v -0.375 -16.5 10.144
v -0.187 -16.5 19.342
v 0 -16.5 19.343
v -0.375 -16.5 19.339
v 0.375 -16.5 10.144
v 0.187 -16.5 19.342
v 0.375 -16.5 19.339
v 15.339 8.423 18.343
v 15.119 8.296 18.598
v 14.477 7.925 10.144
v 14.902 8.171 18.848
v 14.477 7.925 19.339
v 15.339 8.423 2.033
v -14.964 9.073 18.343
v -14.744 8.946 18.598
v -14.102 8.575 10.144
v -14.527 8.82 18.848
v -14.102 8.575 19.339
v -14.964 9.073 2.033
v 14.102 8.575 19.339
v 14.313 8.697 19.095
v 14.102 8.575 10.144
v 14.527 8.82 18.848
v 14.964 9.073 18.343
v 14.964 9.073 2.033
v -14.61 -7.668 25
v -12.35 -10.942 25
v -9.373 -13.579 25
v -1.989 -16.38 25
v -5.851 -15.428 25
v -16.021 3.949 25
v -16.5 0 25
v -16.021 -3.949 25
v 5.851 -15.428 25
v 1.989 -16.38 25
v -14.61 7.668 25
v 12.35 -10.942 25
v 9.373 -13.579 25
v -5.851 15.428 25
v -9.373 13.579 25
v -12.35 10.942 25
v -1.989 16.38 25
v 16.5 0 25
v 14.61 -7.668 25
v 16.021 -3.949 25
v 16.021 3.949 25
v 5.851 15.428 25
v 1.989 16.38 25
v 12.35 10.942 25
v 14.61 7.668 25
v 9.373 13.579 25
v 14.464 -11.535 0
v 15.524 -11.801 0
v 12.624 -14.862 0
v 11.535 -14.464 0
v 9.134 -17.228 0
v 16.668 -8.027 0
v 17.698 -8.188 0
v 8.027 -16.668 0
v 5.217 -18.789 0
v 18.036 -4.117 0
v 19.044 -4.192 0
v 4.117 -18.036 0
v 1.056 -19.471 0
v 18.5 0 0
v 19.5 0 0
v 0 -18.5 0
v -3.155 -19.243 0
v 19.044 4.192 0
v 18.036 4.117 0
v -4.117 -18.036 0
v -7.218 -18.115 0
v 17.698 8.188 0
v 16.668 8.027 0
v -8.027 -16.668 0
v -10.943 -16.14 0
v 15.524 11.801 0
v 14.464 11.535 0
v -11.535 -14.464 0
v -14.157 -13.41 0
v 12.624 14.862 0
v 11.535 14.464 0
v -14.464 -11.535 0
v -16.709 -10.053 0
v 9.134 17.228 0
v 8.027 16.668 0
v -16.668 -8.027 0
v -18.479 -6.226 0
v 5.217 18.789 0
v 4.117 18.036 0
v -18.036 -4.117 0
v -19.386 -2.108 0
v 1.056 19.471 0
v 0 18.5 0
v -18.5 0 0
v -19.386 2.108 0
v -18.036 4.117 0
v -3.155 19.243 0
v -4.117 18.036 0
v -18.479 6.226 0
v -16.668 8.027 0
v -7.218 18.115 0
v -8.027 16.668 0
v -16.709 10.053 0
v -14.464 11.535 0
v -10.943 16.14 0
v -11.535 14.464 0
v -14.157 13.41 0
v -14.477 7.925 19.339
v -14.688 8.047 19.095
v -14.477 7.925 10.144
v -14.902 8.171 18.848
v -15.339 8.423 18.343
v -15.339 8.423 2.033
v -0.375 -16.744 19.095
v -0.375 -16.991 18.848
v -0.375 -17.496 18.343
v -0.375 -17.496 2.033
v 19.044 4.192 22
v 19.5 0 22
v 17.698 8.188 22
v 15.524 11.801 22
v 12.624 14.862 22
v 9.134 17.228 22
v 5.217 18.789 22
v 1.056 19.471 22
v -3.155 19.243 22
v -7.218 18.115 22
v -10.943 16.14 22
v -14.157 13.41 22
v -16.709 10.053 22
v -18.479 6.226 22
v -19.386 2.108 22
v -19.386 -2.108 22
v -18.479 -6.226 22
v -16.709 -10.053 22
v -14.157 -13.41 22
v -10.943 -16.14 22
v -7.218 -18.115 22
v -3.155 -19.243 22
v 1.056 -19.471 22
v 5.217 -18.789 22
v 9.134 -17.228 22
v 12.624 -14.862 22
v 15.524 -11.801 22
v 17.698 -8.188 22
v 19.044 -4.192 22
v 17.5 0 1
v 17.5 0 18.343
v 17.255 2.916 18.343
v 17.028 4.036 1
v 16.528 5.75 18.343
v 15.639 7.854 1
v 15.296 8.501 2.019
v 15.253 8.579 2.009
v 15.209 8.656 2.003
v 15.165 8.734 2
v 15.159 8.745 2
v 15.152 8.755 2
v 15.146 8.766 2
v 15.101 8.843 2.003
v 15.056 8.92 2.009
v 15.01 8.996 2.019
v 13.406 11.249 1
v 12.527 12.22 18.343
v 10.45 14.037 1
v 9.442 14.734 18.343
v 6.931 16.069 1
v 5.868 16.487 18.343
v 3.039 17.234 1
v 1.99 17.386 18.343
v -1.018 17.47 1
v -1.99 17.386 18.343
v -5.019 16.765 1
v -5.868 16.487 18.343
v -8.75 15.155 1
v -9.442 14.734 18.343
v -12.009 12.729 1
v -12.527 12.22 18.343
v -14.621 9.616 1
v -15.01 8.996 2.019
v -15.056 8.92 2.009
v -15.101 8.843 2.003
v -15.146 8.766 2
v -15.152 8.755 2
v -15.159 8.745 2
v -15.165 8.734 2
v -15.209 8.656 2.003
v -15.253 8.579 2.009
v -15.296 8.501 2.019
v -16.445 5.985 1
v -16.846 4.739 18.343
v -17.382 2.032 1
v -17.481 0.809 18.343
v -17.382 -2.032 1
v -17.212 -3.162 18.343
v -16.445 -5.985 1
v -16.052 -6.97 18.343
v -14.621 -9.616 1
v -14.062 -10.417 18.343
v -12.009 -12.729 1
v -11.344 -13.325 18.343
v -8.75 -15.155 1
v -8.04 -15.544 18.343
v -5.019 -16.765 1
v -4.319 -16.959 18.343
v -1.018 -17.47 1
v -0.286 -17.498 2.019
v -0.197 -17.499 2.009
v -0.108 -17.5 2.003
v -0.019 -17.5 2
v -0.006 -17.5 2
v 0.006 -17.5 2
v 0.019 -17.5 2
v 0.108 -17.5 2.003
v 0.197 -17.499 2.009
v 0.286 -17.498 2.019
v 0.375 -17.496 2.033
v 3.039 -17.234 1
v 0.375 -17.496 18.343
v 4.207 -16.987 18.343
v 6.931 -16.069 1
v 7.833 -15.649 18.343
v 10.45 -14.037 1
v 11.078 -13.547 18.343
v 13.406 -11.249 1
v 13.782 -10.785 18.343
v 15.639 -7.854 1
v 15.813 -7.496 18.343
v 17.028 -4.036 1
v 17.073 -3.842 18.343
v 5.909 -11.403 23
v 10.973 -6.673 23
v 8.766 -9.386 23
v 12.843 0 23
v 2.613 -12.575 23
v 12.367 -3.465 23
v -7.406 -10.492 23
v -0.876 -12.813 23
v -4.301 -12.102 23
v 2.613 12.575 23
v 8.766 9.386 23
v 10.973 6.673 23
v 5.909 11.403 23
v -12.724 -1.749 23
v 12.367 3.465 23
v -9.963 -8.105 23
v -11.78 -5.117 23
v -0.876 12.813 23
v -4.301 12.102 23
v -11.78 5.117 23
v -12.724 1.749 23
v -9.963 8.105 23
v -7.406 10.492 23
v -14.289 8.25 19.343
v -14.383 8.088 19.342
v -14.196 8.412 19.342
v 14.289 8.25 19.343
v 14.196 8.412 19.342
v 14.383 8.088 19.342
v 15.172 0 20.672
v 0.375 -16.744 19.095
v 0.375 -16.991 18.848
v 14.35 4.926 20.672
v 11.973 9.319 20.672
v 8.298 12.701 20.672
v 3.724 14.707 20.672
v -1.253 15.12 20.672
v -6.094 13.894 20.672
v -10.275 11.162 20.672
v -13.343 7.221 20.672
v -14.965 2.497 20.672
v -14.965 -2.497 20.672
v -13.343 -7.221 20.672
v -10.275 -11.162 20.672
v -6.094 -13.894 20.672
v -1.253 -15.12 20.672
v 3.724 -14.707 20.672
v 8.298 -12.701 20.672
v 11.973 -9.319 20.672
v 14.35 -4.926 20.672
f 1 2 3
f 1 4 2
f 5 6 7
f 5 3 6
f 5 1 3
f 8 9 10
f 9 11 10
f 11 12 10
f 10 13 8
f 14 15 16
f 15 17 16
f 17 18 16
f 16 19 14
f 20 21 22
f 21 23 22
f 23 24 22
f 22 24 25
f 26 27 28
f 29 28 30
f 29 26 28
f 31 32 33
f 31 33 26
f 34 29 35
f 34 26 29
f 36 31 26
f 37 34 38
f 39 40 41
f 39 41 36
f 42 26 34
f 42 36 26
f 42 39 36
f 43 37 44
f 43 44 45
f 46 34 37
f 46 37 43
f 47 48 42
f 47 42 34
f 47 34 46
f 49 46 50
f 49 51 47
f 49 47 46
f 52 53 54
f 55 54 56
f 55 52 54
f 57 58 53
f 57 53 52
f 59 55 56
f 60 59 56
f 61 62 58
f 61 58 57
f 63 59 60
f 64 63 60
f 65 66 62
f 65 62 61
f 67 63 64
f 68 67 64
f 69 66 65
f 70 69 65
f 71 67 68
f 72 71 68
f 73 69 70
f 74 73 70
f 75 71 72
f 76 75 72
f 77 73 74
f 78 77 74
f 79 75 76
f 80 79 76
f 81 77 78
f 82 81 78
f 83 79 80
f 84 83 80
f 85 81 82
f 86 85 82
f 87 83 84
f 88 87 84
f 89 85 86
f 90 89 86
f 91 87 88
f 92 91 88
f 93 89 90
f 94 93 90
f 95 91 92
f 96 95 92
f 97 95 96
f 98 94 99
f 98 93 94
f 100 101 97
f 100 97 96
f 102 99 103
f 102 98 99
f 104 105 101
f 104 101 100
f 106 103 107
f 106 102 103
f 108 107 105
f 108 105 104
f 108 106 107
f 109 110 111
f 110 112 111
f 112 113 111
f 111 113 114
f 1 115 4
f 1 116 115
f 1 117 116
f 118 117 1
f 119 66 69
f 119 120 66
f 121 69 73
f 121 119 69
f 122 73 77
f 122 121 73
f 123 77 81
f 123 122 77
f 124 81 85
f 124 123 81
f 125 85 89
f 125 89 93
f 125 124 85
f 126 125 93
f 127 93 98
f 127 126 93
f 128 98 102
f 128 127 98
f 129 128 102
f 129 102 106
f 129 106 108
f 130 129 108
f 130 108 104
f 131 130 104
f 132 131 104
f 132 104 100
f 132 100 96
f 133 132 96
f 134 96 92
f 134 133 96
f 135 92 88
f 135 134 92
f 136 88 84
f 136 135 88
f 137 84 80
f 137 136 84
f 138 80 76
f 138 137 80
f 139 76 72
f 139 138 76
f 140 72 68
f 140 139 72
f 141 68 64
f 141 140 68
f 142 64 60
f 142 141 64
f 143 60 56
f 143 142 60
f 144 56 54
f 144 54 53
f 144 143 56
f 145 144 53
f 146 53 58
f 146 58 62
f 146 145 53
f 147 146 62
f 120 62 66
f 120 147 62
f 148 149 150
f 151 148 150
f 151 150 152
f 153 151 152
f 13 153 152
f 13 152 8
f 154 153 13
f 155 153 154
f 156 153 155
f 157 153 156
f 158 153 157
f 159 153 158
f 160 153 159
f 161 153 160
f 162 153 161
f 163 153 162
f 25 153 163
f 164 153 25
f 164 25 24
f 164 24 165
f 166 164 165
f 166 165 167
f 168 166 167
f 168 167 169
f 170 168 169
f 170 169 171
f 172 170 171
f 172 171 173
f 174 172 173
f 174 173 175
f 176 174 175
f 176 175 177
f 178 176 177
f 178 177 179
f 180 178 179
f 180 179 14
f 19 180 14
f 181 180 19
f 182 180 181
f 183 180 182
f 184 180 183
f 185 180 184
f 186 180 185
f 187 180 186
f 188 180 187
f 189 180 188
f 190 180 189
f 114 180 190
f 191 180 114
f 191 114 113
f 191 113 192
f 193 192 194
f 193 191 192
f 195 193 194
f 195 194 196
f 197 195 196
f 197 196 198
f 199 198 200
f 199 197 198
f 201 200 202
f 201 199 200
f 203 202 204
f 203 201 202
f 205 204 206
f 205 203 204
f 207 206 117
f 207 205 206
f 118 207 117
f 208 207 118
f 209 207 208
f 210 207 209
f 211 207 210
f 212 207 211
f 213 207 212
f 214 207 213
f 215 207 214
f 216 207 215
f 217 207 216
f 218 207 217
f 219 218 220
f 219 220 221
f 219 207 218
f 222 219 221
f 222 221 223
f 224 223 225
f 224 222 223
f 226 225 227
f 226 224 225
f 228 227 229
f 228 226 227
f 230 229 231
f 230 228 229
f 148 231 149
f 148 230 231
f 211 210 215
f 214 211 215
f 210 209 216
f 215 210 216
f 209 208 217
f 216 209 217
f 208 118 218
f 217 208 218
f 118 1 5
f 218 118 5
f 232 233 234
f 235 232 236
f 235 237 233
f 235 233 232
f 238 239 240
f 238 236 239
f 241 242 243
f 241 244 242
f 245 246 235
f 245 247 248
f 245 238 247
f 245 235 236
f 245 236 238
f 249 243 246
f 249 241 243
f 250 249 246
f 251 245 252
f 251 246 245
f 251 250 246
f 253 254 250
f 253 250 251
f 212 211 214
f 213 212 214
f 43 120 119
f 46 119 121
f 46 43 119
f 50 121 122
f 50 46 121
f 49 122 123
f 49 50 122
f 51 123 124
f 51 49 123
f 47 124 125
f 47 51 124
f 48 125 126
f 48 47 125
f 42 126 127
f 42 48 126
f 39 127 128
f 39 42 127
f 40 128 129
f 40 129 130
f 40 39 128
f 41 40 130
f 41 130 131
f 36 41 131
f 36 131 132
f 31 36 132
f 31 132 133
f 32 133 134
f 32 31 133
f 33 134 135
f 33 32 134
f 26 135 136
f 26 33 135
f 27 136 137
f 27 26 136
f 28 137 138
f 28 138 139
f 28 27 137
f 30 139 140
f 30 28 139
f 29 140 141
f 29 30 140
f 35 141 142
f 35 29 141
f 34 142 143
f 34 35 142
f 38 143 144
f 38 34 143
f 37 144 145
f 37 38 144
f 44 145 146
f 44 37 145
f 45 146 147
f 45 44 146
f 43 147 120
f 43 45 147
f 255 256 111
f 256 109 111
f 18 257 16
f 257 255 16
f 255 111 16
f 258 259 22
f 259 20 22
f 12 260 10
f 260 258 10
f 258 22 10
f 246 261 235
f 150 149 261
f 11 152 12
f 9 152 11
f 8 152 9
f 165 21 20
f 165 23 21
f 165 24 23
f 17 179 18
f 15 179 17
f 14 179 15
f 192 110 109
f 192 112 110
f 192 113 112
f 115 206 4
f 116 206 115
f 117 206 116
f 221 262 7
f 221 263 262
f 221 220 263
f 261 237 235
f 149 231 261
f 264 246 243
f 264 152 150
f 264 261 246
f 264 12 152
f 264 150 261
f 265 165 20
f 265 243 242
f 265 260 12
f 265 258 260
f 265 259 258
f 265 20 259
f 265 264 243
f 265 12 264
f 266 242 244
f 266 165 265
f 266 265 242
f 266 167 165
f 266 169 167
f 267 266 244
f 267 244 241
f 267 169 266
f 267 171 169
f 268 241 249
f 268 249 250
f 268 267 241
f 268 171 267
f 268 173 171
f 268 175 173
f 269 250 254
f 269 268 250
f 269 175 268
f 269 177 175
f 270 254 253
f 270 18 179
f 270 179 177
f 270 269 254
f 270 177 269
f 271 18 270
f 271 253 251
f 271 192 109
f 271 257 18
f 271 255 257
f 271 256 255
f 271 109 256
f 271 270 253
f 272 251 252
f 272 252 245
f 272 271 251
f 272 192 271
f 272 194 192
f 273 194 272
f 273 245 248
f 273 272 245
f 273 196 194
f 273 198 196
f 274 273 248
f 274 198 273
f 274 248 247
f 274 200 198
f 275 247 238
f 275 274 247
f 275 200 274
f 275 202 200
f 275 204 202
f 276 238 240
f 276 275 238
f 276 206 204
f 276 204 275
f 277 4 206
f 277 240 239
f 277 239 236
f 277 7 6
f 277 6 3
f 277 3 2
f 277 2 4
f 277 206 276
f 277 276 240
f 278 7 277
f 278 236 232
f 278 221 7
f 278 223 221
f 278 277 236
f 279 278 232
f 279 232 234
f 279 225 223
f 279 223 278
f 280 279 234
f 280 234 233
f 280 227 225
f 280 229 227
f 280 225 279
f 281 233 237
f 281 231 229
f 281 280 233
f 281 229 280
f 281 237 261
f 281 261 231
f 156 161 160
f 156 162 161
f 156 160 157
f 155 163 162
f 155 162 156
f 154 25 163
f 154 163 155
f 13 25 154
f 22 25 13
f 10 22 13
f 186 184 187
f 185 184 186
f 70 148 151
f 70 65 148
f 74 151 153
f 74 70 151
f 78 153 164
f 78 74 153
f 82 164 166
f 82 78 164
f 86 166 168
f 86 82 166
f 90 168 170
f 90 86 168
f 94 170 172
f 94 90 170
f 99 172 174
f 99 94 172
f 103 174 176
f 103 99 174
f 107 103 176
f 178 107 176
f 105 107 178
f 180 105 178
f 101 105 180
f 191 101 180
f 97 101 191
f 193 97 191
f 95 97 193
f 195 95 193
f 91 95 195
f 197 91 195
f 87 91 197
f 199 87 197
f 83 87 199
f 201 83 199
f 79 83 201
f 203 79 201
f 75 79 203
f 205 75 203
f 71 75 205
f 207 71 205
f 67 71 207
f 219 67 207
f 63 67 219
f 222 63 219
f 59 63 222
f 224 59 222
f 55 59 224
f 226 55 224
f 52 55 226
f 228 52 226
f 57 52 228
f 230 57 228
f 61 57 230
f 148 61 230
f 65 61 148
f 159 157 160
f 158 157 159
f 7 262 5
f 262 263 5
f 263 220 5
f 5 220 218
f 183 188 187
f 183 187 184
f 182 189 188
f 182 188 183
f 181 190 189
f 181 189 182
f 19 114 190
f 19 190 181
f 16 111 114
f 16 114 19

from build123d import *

# Parameters (mm, degrees)
F3_W       = 0.75
F3_H       = 1.9961989338
F5_SIZE2   = 8.144336
F5_SIZE    = 0.99999
F5_2_SIZE2 = 8.144336
F5_2_SIZE  = 0.99999
F5_3_SIZE2 = 8.144336
F5_3_SIZE  = 0.99999


# Not quite as in the source:
# - a fillet or chamfer is up to 0.001 mm smaller than in the source, because OpenCascade refuses the exact size


with BuildPart() as f1:
    # F0 (on Front) → F1 (revolve)
    with BuildSketch(Plane.XZ):
        Polygon((16.5, 25), (0, 25), (0, 23), (12.8431457505, 23), (17.5, 18.3431457505), (17.5, 1), (18.5, 0), (19.5, 0), (19.5, 22), align=None)
    revolve(axis=Axis((0, 0, 16.9686058983), (0, 0, 1)))

    # F3 (on offset) → F4 (join, up to the next surface of F1)
    with BuildSketch(Plane.XY.offset(2)):
        with Locations((0, -17.4980994669)):
            Rectangle(F3_W, F3_H)
        Polygon((16.2056781502, 8.9233399405), (15.8306781502, 9.5728589933), (14.1019191624, 8.5747595264), (14.4769191624, 7.9252404736), align=None)
        Polygon((-15.8306781502, 9.5728589933), (-16.2056781502, 8.9233399405), (-14.4769191624, 7.9252404736), (-14.1019191624, 8.5747595264), align=None)
    extrude(until=Until.NEXT)

    # F5 (size 1 and 8.144346428 in the source; OpenCascade refuses exactly that, so slightly less here)
    f5_edges = [f1.edges().sort_by_distance(p)[0] for p in [
        (0, -16.5, 2),
    ]]
    f5_side = f1.faces().sort_by_distance((0, -16.999331, 2))[0]
    chamfer(f5_edges, length=F5_SIZE, length2=F5_SIZE2, reference=f5_side)

    # F5#2 (size 1 and 8.144346428 in the source; OpenCascade refuses exactly that, so slightly less here)
    f5_2_edges = [f1.edges().sort_by_distance(p)[0] for p in [
        (14.289419, 8.25, 2),
    ]]
    f5_2_side = f1.faces().sort_by_distance((14.721853, 8.499666, 2))[0]
    chamfer(f5_2_edges, length=F5_2_SIZE, length2=F5_2_SIZE2, reference=f5_2_side)

    # F5#3 (size 1 and 8.144346428 in the source; OpenCascade refuses exactly that, so slightly less here)
    f5_3_edges = [f1.edges().sort_by_distance(p)[0] for p in [
        (-14.289419, 8.25, 2),
    ]]
    f5_3_side = f1.faces().sort_by_distance((-14.721853, 8.499666, 2))[0]
    chamfer(f5_3_edges, length=F5_3_SIZE, length2=F5_3_SIZE2, reference=f5_3_side)


solid = f1.part
